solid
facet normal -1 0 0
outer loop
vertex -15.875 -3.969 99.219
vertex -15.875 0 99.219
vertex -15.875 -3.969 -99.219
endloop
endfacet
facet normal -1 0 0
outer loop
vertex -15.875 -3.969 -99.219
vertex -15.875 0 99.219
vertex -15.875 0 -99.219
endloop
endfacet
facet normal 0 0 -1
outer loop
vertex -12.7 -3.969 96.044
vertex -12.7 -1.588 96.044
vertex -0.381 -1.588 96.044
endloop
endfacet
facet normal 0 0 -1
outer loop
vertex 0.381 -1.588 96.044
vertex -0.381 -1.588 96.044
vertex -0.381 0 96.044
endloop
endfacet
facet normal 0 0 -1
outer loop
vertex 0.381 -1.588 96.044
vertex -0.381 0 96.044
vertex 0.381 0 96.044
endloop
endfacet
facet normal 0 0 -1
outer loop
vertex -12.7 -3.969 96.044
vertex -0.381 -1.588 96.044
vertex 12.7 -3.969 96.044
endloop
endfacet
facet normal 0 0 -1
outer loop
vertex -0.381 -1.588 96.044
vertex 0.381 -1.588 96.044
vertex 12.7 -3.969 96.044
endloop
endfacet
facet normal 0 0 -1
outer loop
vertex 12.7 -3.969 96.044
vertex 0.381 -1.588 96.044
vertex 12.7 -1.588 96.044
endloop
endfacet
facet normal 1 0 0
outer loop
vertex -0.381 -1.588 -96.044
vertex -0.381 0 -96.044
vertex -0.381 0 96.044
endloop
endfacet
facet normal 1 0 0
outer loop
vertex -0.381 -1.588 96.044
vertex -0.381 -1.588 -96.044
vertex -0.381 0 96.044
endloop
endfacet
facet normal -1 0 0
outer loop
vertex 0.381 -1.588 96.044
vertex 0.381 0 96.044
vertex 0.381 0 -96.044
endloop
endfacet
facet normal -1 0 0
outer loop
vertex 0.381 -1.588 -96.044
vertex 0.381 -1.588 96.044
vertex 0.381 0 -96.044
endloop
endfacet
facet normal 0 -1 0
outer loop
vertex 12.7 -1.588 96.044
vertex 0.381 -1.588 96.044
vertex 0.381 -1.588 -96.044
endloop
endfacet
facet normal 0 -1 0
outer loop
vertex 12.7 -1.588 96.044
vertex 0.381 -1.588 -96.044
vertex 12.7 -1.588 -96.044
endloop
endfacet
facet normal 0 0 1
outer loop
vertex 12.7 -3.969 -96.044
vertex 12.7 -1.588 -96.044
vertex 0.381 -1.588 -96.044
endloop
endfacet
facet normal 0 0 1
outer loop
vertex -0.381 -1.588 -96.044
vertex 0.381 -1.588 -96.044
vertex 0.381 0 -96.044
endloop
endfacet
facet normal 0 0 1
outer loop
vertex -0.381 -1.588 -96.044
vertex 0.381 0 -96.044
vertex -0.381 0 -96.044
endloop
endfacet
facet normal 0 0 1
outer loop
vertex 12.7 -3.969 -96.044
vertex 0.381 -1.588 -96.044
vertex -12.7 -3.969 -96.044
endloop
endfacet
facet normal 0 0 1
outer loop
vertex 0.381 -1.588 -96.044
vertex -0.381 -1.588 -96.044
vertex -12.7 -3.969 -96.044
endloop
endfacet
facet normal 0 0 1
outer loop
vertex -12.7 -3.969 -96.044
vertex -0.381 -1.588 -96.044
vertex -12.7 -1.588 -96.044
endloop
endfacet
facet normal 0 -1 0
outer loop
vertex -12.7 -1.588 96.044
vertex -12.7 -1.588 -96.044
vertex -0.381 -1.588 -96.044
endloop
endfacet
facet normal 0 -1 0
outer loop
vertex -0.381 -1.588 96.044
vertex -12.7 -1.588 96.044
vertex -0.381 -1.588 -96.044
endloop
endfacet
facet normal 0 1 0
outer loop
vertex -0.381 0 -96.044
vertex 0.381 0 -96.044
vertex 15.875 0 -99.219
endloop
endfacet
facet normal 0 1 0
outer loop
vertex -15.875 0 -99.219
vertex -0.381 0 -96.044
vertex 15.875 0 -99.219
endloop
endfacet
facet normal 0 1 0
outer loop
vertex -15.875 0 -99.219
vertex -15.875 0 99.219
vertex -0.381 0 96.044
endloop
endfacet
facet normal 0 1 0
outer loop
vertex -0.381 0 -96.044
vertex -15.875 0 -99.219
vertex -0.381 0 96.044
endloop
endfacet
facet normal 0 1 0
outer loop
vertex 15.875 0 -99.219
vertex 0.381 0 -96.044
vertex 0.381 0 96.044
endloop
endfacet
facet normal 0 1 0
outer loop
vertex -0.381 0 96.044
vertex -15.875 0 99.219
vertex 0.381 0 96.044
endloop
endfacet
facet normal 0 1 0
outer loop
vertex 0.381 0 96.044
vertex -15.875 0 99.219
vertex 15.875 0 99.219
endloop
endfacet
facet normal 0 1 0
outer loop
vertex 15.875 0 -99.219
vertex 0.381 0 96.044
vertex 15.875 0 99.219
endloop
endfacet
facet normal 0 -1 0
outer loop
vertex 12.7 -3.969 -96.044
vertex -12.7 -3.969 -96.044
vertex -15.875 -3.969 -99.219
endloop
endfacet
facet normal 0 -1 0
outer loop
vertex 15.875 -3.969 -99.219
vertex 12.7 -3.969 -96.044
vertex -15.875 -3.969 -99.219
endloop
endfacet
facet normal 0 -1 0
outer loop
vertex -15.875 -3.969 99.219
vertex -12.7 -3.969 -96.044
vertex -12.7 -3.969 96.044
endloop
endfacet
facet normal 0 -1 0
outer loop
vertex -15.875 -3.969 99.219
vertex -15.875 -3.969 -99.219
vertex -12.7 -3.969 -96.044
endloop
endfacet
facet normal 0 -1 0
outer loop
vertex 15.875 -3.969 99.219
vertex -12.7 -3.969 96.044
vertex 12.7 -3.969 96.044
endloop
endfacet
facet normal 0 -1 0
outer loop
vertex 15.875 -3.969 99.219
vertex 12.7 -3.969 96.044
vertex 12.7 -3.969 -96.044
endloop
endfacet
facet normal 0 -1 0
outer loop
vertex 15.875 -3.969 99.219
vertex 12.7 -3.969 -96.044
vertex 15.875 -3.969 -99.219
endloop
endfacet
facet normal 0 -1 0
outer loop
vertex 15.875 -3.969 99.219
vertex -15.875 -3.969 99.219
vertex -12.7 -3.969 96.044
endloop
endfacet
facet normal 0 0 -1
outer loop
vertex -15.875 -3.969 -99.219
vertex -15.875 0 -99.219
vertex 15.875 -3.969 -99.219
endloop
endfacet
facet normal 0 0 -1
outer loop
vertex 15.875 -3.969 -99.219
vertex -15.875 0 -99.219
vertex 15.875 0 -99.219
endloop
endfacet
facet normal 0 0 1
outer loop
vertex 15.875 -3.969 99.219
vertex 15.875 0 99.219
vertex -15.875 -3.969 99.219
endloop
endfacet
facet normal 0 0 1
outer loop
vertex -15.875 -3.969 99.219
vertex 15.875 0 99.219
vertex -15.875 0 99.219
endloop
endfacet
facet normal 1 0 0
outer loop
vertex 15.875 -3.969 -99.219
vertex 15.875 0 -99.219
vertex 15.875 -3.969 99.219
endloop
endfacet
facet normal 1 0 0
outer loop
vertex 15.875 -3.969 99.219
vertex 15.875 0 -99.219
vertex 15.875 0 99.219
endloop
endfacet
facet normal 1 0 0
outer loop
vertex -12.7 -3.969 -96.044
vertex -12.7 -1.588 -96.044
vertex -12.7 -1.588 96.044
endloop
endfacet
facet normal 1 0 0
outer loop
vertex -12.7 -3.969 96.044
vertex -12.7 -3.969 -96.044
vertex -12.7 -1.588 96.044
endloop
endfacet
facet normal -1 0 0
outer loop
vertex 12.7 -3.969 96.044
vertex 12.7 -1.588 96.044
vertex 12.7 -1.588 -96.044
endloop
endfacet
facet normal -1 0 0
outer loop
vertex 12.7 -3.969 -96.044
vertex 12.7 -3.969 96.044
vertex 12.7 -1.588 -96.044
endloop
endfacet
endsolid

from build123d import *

# Parameters (mm, degrees)
F1_DEPTH = 3.96875
F0_W     = 12.319
F0_H     = 96.04375
F2_DEPTH = 1.5875


with BuildPart() as f1:
    # F0 (on Front) → F1 (new body)
    with BuildSketch(Plane.XZ):
        Polygon((12.7, -96.04375), (15.875, -99.21875), (15.875, 99.21875), (12.7, 96.04375), (12.7, 0), align=None)
        Polygon((-15.875, -99.21875), (-12.7, -96.04375), (-12.7, 0), (-12.7, 96.04375), (-15.875, 99.21875), align=None)
        Polygon((-15.875, 99.21875), (-12.7, 96.04375), (-0.381, 96.04375), (0.381, 96.04375), (12.7, 96.04375), (15.875, 99.21875), align=None)
        Polygon((-0.381, -96.04375), (-12.7, -96.04375), (-15.875, -99.21875), (15.875, -99.21875), (12.7, -96.04375), (0.381, -96.04375), align=None)
    extrude(amount=F1_DEPTH)

    # F0 (on Front) → F2 (join)
    with BuildSketch(Plane.XZ):
        with Locations((6.5405, 48.021875)):
            Rectangle(F0_W, F0_H)
        with Locations((-6.5405, 48.021875)):
            Rectangle(F0_W, F0_H)
        with Locations((-6.5405, -48.021875)):
            Rectangle(F0_W, F0_H)
        with Locations((6.5405, -48.021875)):
            Rectangle(F0_W, F0_H)
    extrude(amount=F2_DEPTH)


solid = f1.part
